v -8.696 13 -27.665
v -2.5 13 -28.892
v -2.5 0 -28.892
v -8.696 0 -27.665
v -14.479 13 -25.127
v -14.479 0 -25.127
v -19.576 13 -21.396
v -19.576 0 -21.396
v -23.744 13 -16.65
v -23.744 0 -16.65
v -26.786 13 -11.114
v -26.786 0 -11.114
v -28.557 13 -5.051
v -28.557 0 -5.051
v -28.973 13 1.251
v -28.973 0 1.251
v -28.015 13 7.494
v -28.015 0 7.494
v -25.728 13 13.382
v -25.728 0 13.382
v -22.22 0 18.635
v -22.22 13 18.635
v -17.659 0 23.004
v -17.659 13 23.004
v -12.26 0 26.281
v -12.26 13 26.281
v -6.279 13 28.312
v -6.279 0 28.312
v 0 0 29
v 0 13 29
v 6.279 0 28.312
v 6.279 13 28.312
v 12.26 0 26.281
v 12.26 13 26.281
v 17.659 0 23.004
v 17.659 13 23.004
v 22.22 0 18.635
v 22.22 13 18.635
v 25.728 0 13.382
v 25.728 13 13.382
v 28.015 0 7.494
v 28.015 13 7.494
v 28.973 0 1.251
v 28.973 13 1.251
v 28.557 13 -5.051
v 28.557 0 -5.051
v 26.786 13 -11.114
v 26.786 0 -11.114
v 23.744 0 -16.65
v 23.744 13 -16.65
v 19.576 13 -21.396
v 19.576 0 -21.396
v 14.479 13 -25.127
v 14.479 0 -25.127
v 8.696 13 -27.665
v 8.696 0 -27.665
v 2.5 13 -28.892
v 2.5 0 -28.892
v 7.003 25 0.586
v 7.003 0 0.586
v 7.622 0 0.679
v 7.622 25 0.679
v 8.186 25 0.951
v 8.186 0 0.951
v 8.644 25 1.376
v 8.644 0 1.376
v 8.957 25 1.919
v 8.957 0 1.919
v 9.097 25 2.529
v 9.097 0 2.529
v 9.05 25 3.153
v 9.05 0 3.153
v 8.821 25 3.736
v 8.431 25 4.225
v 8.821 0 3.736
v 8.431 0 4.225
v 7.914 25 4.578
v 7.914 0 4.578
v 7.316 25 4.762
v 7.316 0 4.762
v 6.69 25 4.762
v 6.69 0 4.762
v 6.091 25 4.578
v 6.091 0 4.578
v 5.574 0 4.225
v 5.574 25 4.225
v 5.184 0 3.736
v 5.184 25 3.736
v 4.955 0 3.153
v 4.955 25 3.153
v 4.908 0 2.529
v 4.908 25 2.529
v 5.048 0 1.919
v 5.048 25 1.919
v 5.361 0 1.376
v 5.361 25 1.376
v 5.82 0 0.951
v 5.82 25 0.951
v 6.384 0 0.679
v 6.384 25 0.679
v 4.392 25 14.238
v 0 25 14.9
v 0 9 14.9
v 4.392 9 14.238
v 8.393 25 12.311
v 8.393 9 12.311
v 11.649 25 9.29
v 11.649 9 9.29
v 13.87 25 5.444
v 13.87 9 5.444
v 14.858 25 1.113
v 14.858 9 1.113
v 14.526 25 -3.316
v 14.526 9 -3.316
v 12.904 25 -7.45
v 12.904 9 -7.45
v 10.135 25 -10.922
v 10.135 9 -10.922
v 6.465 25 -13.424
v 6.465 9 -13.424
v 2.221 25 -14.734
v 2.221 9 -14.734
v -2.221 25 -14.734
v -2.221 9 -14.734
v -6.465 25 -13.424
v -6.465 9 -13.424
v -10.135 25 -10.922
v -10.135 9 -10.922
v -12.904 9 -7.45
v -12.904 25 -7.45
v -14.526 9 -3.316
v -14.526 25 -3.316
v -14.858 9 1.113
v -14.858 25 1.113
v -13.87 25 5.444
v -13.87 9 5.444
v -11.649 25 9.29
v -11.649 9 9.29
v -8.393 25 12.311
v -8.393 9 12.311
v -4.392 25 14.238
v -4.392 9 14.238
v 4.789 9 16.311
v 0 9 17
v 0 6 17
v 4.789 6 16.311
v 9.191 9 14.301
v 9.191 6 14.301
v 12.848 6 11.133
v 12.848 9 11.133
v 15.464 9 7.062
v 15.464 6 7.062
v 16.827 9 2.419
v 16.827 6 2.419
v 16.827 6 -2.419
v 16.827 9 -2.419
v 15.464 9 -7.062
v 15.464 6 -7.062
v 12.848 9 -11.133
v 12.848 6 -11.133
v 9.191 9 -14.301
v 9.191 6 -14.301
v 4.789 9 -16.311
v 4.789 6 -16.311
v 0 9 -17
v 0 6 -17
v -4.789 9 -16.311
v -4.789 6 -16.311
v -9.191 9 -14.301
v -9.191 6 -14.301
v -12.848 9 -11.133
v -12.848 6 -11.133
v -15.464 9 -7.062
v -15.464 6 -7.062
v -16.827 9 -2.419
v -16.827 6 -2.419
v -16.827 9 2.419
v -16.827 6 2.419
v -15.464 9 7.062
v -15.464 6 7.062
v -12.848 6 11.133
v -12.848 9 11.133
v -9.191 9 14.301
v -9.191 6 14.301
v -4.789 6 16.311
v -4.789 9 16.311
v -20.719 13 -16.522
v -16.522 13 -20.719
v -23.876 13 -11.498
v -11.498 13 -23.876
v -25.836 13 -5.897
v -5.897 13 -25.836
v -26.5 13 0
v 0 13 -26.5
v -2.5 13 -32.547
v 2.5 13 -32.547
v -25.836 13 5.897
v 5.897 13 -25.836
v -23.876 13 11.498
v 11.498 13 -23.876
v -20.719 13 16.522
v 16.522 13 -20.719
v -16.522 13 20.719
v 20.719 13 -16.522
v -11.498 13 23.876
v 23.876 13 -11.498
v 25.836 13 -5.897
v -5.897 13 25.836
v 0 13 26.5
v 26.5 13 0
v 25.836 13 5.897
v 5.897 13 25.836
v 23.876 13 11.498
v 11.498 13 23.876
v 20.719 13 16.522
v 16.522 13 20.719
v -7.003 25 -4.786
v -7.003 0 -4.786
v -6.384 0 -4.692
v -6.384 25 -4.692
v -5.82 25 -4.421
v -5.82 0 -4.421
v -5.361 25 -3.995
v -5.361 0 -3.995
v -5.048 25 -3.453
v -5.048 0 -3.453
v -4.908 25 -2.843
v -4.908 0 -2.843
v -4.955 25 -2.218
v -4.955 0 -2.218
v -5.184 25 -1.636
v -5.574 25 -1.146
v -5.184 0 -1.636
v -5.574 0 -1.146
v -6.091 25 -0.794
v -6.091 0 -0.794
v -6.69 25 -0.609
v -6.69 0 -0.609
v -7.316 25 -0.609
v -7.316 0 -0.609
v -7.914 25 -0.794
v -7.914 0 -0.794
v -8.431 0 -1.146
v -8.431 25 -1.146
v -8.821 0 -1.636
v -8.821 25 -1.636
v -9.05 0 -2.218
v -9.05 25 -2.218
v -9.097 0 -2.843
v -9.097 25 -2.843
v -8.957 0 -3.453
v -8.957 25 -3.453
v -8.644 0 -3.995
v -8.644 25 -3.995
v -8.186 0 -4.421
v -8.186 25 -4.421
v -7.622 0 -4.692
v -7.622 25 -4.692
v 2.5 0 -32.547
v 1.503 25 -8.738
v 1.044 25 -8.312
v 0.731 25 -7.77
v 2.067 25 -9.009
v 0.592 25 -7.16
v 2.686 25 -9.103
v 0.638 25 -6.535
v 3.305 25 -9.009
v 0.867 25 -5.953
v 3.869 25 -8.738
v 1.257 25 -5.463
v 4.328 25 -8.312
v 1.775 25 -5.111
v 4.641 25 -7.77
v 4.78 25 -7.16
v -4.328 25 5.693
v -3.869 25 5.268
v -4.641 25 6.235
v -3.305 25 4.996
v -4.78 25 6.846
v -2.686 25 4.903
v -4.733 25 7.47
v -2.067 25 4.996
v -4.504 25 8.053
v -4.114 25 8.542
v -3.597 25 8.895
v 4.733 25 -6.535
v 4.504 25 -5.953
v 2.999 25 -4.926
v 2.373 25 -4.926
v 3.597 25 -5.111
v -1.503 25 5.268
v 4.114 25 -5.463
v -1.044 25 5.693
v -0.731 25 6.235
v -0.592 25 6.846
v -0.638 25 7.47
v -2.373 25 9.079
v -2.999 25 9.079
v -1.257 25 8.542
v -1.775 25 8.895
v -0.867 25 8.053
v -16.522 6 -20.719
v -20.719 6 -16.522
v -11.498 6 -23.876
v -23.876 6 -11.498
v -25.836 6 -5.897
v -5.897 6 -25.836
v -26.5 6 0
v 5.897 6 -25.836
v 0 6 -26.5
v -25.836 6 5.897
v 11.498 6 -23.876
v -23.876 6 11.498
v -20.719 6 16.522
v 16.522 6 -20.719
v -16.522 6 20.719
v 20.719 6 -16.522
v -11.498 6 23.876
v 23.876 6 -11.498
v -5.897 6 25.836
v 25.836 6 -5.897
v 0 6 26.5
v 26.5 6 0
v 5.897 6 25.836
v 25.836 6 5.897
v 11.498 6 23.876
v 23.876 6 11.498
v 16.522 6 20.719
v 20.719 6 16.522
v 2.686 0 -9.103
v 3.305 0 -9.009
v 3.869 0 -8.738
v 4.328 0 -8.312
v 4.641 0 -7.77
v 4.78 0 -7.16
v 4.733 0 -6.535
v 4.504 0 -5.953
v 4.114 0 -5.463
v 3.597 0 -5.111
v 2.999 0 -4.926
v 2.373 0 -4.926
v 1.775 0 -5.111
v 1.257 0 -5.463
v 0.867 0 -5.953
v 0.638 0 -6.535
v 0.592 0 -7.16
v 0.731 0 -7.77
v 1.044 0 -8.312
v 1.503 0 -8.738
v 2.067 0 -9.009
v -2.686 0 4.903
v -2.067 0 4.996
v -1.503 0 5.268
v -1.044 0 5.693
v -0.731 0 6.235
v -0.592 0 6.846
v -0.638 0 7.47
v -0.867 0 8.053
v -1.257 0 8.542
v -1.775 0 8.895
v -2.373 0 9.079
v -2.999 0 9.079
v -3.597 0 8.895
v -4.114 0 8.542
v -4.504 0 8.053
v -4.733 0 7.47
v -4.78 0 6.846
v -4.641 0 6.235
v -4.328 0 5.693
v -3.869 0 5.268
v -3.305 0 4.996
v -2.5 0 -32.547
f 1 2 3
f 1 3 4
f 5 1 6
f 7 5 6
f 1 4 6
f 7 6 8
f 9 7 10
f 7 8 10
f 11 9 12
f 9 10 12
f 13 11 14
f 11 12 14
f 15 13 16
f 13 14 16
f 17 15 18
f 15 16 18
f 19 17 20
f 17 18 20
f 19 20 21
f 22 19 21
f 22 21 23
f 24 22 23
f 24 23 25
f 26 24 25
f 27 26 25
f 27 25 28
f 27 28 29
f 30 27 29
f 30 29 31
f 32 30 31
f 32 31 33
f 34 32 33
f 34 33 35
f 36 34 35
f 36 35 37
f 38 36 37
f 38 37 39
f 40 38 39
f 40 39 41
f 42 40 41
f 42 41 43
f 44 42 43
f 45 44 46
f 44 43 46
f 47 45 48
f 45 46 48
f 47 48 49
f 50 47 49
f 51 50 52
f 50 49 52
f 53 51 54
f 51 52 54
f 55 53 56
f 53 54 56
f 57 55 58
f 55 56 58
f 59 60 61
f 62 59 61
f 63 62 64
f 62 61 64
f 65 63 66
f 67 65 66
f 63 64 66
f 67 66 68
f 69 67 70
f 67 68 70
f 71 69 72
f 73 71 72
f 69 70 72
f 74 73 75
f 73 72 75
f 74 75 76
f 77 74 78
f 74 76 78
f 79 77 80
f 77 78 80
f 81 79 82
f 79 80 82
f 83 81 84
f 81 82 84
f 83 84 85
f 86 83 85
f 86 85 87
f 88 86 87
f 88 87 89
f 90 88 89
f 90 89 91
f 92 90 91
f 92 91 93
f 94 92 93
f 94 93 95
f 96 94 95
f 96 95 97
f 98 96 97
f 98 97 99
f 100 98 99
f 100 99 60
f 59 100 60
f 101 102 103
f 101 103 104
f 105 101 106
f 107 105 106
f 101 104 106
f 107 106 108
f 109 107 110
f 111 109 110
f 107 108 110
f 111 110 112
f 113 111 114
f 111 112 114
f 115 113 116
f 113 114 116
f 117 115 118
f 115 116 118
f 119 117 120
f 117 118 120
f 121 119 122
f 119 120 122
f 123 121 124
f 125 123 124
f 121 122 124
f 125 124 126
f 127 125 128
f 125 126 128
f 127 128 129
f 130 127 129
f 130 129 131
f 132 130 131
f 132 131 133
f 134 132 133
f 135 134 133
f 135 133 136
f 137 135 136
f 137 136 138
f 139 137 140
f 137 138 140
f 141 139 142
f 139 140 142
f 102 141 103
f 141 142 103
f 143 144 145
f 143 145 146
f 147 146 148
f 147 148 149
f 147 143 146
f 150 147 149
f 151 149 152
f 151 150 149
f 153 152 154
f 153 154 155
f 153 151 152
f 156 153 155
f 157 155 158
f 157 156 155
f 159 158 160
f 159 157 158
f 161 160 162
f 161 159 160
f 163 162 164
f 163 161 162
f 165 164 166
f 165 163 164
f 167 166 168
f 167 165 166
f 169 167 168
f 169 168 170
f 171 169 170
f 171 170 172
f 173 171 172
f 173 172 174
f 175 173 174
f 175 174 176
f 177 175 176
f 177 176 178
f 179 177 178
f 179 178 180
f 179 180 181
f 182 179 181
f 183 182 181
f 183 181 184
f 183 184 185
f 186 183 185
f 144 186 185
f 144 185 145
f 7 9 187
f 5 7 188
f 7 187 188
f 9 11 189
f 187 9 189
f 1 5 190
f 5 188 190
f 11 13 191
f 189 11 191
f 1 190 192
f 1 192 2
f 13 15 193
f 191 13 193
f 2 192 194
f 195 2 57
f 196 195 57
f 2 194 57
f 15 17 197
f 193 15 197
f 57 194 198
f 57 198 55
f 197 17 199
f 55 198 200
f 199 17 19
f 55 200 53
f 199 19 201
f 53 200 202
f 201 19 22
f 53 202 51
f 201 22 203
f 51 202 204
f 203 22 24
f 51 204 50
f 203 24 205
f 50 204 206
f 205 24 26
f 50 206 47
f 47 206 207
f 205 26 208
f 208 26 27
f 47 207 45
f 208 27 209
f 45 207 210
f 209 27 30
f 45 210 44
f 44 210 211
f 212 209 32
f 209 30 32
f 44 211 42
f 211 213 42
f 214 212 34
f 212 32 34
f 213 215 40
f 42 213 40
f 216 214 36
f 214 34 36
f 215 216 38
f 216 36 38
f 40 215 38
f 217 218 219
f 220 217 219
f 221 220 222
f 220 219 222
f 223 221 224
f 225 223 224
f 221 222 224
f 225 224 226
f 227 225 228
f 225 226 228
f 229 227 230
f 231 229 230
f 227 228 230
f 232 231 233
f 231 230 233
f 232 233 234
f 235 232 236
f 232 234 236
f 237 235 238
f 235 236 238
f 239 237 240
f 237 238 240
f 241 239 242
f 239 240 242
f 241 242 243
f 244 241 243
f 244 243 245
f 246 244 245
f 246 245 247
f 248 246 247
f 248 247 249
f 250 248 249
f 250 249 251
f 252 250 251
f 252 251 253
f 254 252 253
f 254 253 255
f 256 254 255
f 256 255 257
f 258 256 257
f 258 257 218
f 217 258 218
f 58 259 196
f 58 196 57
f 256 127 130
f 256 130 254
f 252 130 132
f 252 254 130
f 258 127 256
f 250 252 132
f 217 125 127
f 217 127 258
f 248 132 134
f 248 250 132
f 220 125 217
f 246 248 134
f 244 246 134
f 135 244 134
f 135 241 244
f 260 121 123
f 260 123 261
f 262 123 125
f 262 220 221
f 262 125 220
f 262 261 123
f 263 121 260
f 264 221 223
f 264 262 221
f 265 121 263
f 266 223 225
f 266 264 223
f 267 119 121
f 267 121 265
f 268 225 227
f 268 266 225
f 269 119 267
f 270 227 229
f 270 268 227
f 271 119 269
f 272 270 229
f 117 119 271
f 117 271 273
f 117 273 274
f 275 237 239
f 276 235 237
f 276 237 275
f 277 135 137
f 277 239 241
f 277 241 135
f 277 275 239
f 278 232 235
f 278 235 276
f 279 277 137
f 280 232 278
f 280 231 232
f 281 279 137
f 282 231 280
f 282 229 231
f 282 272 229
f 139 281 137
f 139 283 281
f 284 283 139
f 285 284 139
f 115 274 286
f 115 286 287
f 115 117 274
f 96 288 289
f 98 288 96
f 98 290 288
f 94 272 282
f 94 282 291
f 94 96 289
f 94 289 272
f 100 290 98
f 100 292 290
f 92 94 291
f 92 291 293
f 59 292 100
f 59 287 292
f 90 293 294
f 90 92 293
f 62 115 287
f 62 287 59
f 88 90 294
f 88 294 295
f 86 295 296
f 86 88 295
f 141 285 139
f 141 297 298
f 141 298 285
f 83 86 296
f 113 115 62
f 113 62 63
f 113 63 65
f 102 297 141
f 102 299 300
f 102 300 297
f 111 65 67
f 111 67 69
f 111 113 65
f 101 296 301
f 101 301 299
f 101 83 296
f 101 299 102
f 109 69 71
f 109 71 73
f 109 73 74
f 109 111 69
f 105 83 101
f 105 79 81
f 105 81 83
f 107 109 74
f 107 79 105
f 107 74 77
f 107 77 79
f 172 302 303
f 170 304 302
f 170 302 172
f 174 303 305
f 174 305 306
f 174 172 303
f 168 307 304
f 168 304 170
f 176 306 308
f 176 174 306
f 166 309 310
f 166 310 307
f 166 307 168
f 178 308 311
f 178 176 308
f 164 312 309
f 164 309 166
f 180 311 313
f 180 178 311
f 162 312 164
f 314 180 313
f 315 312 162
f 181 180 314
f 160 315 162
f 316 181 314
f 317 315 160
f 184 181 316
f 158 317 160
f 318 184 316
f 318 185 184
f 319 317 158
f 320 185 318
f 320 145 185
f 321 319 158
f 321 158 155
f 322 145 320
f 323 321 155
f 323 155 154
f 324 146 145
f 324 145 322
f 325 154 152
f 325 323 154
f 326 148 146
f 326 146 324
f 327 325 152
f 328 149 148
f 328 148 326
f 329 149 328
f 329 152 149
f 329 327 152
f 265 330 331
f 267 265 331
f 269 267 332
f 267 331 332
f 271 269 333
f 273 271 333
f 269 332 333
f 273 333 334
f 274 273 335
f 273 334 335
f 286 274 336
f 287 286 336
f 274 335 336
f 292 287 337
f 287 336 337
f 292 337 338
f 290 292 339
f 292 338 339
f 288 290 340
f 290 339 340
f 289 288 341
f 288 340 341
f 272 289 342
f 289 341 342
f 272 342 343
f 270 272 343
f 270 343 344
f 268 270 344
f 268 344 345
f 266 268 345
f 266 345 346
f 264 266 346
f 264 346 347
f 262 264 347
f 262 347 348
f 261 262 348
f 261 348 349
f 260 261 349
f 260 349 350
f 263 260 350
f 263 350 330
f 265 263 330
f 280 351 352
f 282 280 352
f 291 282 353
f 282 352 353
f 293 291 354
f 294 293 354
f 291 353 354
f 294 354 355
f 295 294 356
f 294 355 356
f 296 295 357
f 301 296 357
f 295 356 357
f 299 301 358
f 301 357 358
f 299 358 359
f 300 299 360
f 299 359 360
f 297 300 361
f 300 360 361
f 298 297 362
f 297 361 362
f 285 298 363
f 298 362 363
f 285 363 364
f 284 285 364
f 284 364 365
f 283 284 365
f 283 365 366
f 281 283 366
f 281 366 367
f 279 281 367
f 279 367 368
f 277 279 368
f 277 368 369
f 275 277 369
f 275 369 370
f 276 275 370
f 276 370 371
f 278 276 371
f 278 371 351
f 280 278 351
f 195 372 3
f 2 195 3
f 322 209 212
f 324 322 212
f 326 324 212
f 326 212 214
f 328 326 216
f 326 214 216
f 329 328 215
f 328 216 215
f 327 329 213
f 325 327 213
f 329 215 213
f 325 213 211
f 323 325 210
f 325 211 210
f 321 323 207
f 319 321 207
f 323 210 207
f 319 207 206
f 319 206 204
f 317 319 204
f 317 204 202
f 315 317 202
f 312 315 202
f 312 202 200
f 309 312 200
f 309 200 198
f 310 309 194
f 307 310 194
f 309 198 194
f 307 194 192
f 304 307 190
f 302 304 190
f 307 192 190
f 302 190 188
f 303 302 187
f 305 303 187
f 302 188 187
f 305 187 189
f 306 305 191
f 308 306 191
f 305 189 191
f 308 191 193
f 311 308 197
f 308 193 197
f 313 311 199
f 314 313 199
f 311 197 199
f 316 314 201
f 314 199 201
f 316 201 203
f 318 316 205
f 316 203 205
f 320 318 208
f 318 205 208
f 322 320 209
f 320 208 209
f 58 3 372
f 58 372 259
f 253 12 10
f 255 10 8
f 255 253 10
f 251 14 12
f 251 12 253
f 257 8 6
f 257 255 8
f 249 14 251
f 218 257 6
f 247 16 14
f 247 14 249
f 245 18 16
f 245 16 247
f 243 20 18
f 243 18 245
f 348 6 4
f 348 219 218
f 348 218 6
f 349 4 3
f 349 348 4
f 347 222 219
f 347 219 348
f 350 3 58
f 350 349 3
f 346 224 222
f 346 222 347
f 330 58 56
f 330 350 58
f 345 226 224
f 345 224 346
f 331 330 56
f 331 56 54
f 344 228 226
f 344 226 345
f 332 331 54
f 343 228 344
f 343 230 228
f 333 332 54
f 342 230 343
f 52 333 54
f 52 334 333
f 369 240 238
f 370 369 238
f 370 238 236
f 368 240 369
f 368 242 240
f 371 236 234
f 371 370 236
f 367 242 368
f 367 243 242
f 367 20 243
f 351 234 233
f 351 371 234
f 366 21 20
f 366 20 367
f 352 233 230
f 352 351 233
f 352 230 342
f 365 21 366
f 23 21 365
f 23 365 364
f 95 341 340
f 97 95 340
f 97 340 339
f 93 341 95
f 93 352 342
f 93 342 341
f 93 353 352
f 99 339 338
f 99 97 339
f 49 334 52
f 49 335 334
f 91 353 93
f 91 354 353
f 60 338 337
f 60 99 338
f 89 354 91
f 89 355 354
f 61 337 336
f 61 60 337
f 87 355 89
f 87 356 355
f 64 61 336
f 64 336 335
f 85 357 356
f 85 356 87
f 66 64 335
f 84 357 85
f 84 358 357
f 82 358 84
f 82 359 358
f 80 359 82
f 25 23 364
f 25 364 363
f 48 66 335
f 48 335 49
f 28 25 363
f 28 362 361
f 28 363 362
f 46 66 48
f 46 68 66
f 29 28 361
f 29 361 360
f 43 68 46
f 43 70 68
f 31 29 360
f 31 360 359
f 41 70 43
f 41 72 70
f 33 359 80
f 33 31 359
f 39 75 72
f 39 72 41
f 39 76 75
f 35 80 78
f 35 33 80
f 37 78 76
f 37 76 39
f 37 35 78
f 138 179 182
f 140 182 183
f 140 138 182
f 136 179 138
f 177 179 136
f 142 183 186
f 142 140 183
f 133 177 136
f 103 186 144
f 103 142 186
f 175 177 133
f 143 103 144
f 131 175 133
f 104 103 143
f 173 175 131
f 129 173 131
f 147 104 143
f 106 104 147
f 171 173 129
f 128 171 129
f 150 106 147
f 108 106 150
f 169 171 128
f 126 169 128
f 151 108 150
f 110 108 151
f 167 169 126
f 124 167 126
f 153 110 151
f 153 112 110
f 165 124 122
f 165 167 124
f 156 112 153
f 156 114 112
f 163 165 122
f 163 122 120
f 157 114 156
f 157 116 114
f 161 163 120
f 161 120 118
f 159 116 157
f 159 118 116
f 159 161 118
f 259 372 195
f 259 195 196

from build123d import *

# Parameters (mm, degrees)
SKETCH1_R           = 29
BOSS_EXTRUDE1_DEPTH = 13
SKETCH2_R           = 26.5
SKETCH2_R_2         = 17
CUT_EXTRUDE1_DEPTH  = 7
SKETCH4_R           = 17.25
CUT_EXTRUDE3_DEPTH  = 4
SKETCH5_W           = 5
SKETCH5_H           = 4.624873007
BOSS_EXTRUDE2_DEPTH = 13
SKETCH6_R           = 14.9
BOSS_EXTRUDE3_DEPTH = 16
SKETCH3_R           = 2.1
CUT_EXTRUDE2_DEPTH  = 30


with BuildPart() as part:
    # Sketch1 → Boss-Extrude1 (new body)
    with BuildSketch(Plane(origin=(0, 0, 0), x_dir=(1, 0, 0), z_dir=(0, 1, 0))):
        with Locations(Location((0, 0, 0), (0, 0, 90))):
            Circle(SKETCH1_R)
    extrude(amount=BOSS_EXTRUDE1_DEPTH)

    # Sketch2 → Cut-Extrude1 (cut)
    with BuildSketch(Plane(origin=(0, 13, 0), x_dir=(1, 0, 0), z_dir=(0, 1, 0))):
        with Locations(Location((0, 0, 0), (0, 0, 270))):
            Circle(SKETCH2_R)
        with Locations(Location((0, 0, 0), (0, 0, 270))):
            Circle(SKETCH2_R_2, mode=Mode.SUBTRACT)
    extrude(amount=-CUT_EXTRUDE1_DEPTH, mode=Mode.SUBTRACT)

    # Sketch4 → Cut-Extrude3 (cut)
    with BuildSketch(Plane(origin=(0, 13, 0), x_dir=(1, 0, 0), z_dir=(0, 1, 0))):
        Circle(SKETCH4_R)
    extrude(amount=-CUT_EXTRUDE3_DEPTH, mode=Mode.SUBTRACT)

    # Sketch5 → Boss-Extrude2 (add)
    with BuildSketch(Plane.XZ):
        with Locations((0, -30.234113057)):
            Rectangle(SKETCH5_W, SKETCH5_H)
    extrude(amount=-BOSS_EXTRUDE2_DEPTH)

    # Sketch6 → Boss-Extrude3 (add)
    with BuildSketch(Plane(origin=(0, 9, 0), x_dir=(1, 0, 0), z_dir=(0, 1, 0))):
        with Locations(Location((0, 0, 0), (0, 0, 270))):
            Circle(SKETCH6_R)
    extrude(amount=BOSS_EXTRUDE3_DEPTH)

    # Sketch3 → Cut-Extrude2 (cut)
    with BuildSketch(Plane.XZ):
        with Locations(Location((7.002624358, 2.68574982, 0), (0, 0, 270))):
            Circle(SKETCH3_R)
        with Locations(Location((-7.002624358, -2.68574982, 0), (0, 0, 270))):
            Circle(SKETCH3_R)
        with Locations(Location((2.68574982, -7.002624358, 0), (0, 0, 270))):
            Circle(SKETCH3_R)
        with Locations(Location((-2.68574982, 7.002624358, 0), (0, 0, 270))):
            Circle(SKETCH3_R)
    extrude(amount=-CUT_EXTRUDE2_DEPTH, mode=Mode.SUBTRACT)


solid = part.part
